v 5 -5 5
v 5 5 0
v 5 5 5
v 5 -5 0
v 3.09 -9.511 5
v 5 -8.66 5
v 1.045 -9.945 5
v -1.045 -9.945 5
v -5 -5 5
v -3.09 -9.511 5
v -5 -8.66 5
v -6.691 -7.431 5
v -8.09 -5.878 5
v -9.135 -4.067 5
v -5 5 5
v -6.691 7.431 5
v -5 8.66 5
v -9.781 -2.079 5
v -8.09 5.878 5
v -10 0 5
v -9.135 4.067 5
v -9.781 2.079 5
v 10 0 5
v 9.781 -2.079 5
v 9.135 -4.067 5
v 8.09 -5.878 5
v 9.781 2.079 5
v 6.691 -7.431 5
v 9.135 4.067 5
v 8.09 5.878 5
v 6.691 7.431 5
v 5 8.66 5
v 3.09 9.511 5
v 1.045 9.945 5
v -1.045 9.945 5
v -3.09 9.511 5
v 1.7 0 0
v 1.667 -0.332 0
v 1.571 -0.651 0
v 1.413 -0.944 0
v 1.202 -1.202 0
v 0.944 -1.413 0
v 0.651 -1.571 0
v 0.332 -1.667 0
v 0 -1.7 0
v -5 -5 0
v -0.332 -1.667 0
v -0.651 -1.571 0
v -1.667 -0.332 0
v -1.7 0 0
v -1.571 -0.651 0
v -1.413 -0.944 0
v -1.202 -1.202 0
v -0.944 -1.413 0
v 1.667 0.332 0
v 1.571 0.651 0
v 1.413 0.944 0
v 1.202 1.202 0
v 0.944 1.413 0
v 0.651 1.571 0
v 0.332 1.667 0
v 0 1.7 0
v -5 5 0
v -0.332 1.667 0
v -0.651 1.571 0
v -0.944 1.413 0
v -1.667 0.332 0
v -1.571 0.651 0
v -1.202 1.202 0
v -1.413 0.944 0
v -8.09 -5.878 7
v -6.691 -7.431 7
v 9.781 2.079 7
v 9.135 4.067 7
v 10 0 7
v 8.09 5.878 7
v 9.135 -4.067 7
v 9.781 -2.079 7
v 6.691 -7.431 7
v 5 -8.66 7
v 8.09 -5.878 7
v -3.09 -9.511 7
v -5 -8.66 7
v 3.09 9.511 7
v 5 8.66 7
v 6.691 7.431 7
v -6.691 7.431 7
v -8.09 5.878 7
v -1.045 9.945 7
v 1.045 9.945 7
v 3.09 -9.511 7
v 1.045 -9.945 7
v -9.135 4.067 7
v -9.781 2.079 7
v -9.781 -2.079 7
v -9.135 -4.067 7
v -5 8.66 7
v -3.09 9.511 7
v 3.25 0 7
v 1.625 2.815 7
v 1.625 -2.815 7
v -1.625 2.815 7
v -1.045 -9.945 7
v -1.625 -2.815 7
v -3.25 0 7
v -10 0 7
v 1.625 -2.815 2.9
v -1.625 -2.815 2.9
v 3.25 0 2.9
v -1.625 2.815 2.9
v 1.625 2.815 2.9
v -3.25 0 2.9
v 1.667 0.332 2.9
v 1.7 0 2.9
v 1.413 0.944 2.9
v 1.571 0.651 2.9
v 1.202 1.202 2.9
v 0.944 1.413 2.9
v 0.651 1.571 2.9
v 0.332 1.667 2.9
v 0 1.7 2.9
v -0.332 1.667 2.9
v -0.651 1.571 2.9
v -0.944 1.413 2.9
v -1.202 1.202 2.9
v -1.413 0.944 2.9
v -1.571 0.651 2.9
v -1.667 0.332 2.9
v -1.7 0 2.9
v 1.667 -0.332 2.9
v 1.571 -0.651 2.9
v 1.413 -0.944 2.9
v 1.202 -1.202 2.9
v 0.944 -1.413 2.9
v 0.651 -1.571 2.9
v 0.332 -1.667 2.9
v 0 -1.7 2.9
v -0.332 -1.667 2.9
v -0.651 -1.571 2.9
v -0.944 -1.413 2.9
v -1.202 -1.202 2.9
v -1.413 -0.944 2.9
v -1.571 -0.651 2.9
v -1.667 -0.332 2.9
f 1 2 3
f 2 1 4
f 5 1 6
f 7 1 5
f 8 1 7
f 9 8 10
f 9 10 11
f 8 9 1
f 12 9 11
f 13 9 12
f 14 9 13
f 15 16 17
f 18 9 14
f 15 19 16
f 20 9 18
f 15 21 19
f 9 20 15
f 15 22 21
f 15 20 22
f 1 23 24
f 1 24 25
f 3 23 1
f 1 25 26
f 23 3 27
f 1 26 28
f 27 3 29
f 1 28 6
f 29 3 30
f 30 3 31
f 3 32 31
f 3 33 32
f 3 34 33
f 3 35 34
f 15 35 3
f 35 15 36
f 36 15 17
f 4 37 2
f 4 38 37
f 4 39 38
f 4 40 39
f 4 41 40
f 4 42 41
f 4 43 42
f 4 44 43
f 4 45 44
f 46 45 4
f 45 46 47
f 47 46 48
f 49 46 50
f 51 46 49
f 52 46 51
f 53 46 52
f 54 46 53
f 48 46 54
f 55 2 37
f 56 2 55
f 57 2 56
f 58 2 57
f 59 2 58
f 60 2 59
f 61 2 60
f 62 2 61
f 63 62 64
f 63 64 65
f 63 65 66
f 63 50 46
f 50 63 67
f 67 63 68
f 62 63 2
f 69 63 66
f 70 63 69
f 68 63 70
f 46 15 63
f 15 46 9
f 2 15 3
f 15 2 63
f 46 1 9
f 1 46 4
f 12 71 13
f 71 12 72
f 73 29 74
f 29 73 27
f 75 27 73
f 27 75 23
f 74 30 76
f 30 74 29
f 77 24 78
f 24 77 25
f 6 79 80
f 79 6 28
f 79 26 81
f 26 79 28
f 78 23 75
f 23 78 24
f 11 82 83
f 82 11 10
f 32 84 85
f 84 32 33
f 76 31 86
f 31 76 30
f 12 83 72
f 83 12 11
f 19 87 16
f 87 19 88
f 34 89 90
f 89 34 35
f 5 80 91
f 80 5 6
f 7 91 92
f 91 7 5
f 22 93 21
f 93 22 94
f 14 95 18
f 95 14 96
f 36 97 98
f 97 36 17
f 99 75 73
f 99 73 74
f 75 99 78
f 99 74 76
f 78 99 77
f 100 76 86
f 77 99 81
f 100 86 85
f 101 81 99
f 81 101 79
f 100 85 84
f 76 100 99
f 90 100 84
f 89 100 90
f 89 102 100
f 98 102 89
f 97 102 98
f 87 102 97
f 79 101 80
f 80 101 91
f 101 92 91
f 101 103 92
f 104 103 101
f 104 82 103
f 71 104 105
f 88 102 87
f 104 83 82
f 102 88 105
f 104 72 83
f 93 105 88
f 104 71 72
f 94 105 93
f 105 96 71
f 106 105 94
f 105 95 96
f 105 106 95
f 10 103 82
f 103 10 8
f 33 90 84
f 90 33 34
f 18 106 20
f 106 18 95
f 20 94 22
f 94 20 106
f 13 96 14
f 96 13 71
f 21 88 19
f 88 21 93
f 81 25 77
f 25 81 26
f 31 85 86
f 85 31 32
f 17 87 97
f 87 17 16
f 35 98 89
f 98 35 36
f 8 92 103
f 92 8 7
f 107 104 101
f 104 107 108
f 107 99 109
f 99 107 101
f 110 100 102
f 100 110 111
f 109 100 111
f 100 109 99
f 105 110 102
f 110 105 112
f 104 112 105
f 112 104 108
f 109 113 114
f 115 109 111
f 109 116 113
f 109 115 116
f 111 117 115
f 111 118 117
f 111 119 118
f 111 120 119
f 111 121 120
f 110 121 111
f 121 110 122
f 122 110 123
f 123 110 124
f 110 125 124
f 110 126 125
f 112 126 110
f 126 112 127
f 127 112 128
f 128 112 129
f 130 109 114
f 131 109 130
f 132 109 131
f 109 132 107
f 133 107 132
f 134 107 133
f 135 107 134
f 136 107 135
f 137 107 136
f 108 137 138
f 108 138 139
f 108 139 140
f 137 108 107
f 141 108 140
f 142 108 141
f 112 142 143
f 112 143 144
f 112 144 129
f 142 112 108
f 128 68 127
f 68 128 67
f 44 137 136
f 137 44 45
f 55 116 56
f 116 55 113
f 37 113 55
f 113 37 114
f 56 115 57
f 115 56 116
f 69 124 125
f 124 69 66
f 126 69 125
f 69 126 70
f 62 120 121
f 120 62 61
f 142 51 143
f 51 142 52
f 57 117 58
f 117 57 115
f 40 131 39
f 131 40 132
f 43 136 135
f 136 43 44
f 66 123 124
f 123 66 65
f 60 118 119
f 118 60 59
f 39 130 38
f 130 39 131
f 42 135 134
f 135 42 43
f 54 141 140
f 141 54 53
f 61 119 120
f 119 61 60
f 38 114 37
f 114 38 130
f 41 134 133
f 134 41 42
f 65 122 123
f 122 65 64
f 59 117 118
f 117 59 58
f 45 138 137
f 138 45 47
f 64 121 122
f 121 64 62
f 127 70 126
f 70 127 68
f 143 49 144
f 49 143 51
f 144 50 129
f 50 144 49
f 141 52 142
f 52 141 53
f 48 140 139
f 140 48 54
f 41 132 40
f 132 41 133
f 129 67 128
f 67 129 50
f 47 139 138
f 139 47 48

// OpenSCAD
thickness_border=1.8; //epaisseur de la languette
thickness_device=18; 
thickness_box=5;//epaisseur de la boite
length_border=5;
height_device=20;
length_device=24.5;
border=1;

cjmcu_height=14.6;
cjmcu_width=20.1;
cjmcu_security=0.3;
cjmcu_connector=3.5;
cjmcu_back=4;
cjmcu_border=2;
cjmcu_board=1.6;
cjmcu_stopper=1;

bme_height=14.1;
bme_width=11.1;
bme_security=0.3;
bme_connector=3.5;
bme_back=4;
bme_border=2;
bme_board=1.6;
bme_stopper=1;

function nbhole(length, border)=
    let(nb=floor((length)/(border)))
    (nb-(floor(nb/2)*2)==0) ? nb+1 : nb;


module box() {
    difference() {
        #cube([length_device+2*length_border,thickness_device,height_device]);
        translate([0,thickness_border,0]) cube([length_border,thickness_device-2*thickness_border, height_device]);
        translate([length_device+length_border,thickness_border,0]) cube([length_border,thickness_device-2*thickness_border, height_device]);
    }
}

module grille(length, depth, height, border) {
    difference() {
        cube([length+2*border, depth+border,height+2*border]);
        translate([border,0, border]) cube([length, depth,height]);
        translate([border,border,0]) grille_holes(length-2*border, depth, height, border);
        translate([0,border,height+border]) rotate([0,90,0]) grille_holes(height-2*border, depth, length, border);
        translate([length+border,0,height+border]) rotate([0,90,90]) grille_holes(height-2*border, length+2*border, depth, border);
    }
}

module grille_holes(length, depth, height, border) {
    nb=nbhole(length,border);
    hole=length/nb;
    /*for (j=[0:floor(nb/2)+1]) {
       for (i=[0:2]) {
          translate([(j*2*hole),i*((depth-4*border)/3+border), 0])cube([hole,(depth-4*border)/3,height+2*border]);
       }
    }*/
    for (j=[0:floor(nb/2)+1]) {
       translate([(j*2*hole),0, 0]) cube([hole,(depth-2*border),height+2*border]);
    }
}
//#######################################################

module cjmcu811_back(height=14, width=20, security=0.2, connector=3.5, back=4, border=2, board=1.6, hole=3, hole_distance=0.5,hole_distance_bottom=1) {
    difference() {
        cube([width+2*security+2*border, back+board, height+2*security+2*border]);
        translate([border, back, border]) cube([width+2*security, board, height+2*security]);
        translate([border, 0, height+border-connector]) cube([width+2*security, back, connector+2*security]);
    }
    translate([border+security+hole_distance+hole/2, back, border+security+hole_distance_bottom+hole/2]) rotate([-90,0,0]) cylinder(d=hole-2*security, h=3*board, $fn=64);
    translate([border+security+width-hole_distance-hole/2, back, border+security+hole_distance_bottom+hole/2]) rotate([-90,0,0]) cylinder(d=hole-2*security, h=3*board, $fn=64);
}

module cjmcu811_connector(height=14, width=20, security=0.2, connector=3.5, depth=12, back=4, border=2) {
    translate([border, -depth, height+border-connector]) cube([width+2*security, depth, connector+2*security]);
}


module cjmcu811_front(height=14, width=20, security=0.2, connector=3.5, back=4, board=1.6, border=2, box_border=1 ,stopper=1,stopper_height=3) {
    difference() {
        cube([width+2*security+2*border+2*box_border, back+stopper+board, height+2*security++2*border+2*box_border]);
        translate([box_border, 0, box_border]) cube([width+2*security+2*border, back+board+stopper, height+2*security+2*border]);
        translate([border+box_border, back+board, height+border+box_border-connector]) cube([width+2*security, stopper, connector+2*security]);
        translate([border+box_border, back+board, border+box_border+security]) cube([width+2*security, stopper, height-connector+2*security-stopper_height]);
    }
}

module box_cjmcu811_back() {
    difference() {
        box();
        translate([(length_device+2*length_border-(cjmcu_width+2*cjmcu_security+2*cjmcu_border))/2,thickness_device,(height_device-(cjmcu_height+2*cjmcu_security+2*cjmcu_border))/2]) {
            cjmcu811_connector(height=cjmcu_height, width=cjmcu_width, security=cjmcu_security, back=cjmcu_back, border=cjmcu_border, depth=thickness_device);
        //cjmcu811_front();
        }
    }
    translate([(length_device+2*length_border-(cjmcu_width+2*cjmcu_security+2*cjmcu_border))/2,thickness_device,(height_device-(cjmcu_height+2*cjmcu_security+2*cjmcu_border))/2]) {
        cjmcu811_back(height=cjmcu_height, width=cjmcu_width, security=cjmcu_security, back=cjmcu_back, border=cjmcu_border);
        //cjmcu811_front();
    }
}

module box_cjmcu811_front(depth=5, border=1, box_security=0.15) {
    cjmcu811_front(height=cjmcu_height+box_security, width=cjmcu_width+box_security, security=cjmcu_security, back=cjmcu_back, border=cjmcu_border, box_border=border);
    translate([0,cjmcu_back+cjmcu_stopper+cjmcu_board-cjmcu_border,0]) grille(cjmcu_width+2*cjmcu_security+2*cjmcu_border+box_security, depth, cjmcu_height+2*cjmcu_security+2*cjmcu_border+box_security, border);
}


//#######################################################

module bme280_back(height=14, width=20, security=0.2, connector=3.5, back=4, border=2, board=1.6, hole=3, hole_distance=1,hole_distance_bottom=1.4) {
    difference() {
        cube([width+2*security+2*border, back+board, height+2*security+2*border]);
        translate([border, back, border]) cube([width+2*security, board, height+2*security]);
        translate([border, 0, height+border-connector]) cube([width+2*security, back, connector+2*security]);
        #translate([border,back-4,border])cube([width-hole_distance-hole-security,4,7]);
    }
    //translate([border+security+hole_distance+hole/2, back, border+security+hole_distance+hole/2]) rotate([-90,0,0]) cylinder(d=hole-2*security, h=3*board, $fn=64);
    translate([border+security+width-hole_distance-hole/2, back, border+security+hole_distance_bottom+hole/2]) rotate([-90,0,0]) cylinder(d=hole-2*security, h=3*board, $fn=64);
}

module bme280_connector(height=14, width=20, security=0.2, connector=3.5, depth=12, back=4, border=2) {
    translate([border, -depth, height+border-connector]) cube([width+2*security, depth, connector+2*security]);
}


module bme280_front(height=14, width=20, security=0.2, connector=3, back=4, board=1.6, border=2, box_border=1 ,stopper=1,stopper_height=3) {
    difference() {
        cube([width+2*security+2*border+2*box_border, back+stopper+board, height+2*security++2*border+2*box_border]);
        translate([box_border, 0, box_border]) cube([width+2*security+2*border, back+board+stopper, height+2*security+2*border]);
        translate([border+box_border, back+board, height+border+box_border-connector]) cube([width+2*security, stopper, connector+2*security]);
        translate([border+box_border, back+board, border+box_border+security]) cube([width+2*security, stopper, height-connector+2*security-stopper_height]);
    }
}

module box_bme280_back() {
    difference() {
        box();
        translate([(length_device+2*length_border-(bme_width+2*bme_security+2*bme_border))/2,thickness_device,(height_device-(bme_height+2*bme_security+2*bme_border))/2]) {
            bme280_connector(height=bme_height, width=bme_width, security=bme_security, back=bme_back, border=bme_border, depth=thickness_device);
            
        //bme280_front();
        }
    }
    translate([(length_device+2*length_border-(bme_width+2*bme_security+2*bme_border))/2,thickness_device,(height_device-(bme_height+2*bme_security+2*bme_border))/2]) {
        bme280_back(height=bme_height, width=bme_width, security=bme_security, back=bme_back, border=bme_border);
        //bme280_front();
    }
}

module box_bme280_front(depth=5, border=1, box_security=0.15) {
    bme280_front(height=bme_height+box_security, width=bme_width+box_security, security=bme_security, back=bme_back, border=bme_border, box_border=border);
    translate([0,bme_back+bme_stopper+bme_board-bme_border,0]) grille(bme_width+2*bme_security+2*bme_border+box_security, depth, bme_height+2*bme_security+2*bme_border+box_security, border);
}

//#######################################################

module led(security=0.3, height=8.5, diameter=5, base=5.6, base_height=1,fake_base=10) {
    if (fake_base>0) translate([0,0,-fake_base]) cylinder(d=base+security, h=fake_base,$fn=64);
    cylinder(d=base+security, h=security+base_height,$fn=64);
    translate([0,0,base_height]) cylinder(d=diameter+security, h=height-diameter/2-base_height,$fn=64);
    translate([0,0,height-diameter/2]) sphere(d=diameter+security,$fn=64);
    
}

module light(diameter=10, base=5, base_height=1, thickness=thickness_device, inside=3, border=2) {
    difference() {
        union() {
            translate([0,0,thickness+base_height-inside]) led(security=0, height=8.5+border, diameter=5+2*border, base=5.6+border,fake_base=0);
            cylinder(d=diameter, h=thickness,$fn=64);
            translate([0,0,thickness])cylinder(d=diameter+2*base, h=base_height,$fn=64);
        }
        translate([0,0,thickness+base_height-inside]) led(fake_base=thickness+base_height);
    }
    
}

//#######################################################


module screw(hole=3.4, diameter=6.5, screw_height=3.2, height=5, width=8) {
    difference() {
        translate([-width/2, -width/2, 0]) cube([width, width,height]);
        screw_footprint(hole=hole, diameter=diameter, screw_height=screw_height, height=height);
    }
}


module screw_footprint(hole=3.4, diameter=6.5, screw_height=3.2, height=5) {
    translate([0, 0, (height-screw_height)/2])cylinder(d=diameter, h=height, $fn=6);
    cylinder(d=hole,h=height,$fn=32);
}

// ##############################

module support_board(hole=3.2, diam=5, height=5, width=10, base=5) {
    translate([0,0,base]) {
        difference() {
            cylinder(d=diam, h=height, $fn=32);
            cylinder(d=hole, h=height, $fn=32);   
        }
    }
    translate([0,0,base]) rotate([180,0,0]) screw(width=width, height=base);
}

module support_iC880A(diam=5,height=5, width=10, base=5) {
    translate([(width/2)-6.15,(width/2)-2.9,0]) {
        translate([6.15,2.9,0]) rotate([0,0,180])support_board(diam=diam, width=width,height=height, base=base);
        translate([61.15,2.9,0]) rotate([0,0,180])support_board(diam=diam, width=width,height=height, base=base);
        translate([6.15,76.9,0]) rotate([0,0,0]) support_board(diam=diam, width=width,height=height, base=base);
        translate([61.15,76.9,0]) rotate([0,0,0]) support_board(diam=diam, width=width,height=height, base=base);
    }
}

//encoche 67x86
//border=thickness_border,outside_border=5
module box_iC880A(diam=5,height=5.2, width=10, thickness=thickness_box+0.2, border=thickness_border,outside_border=5) {
    translate([0,0,-border]) support_iC880A(diam=diam, width=width,height=height, base=thickness+2*border);
    translate([0,-border-outside_border,-border]) {
        difference() {
            cube([(61.15-6.15)+width+border+outside_border,(76.9-2.9)+width+2*border+2*outside_border , thickness+2*border]);
            #translate([0,border+outside_border,0]) cube([(61.15-6.15)+width,(76.9-2.9)+width , thickness+2*border]);
            translate([0,(76.9-2.9)+width+2*border+outside_border,border]) cube([(61.15-6.15)+width+border+outside_border,outside_border , thickness]);
            translate([(61.15-6.15)+width+border,0,border]) cube([outside_border,(76.9-2.9)+width+2*border+2*outside_border , thickness]);
            translate([0,0,border]) cube([(61.15-6.15)+width+border+outside_border,outside_border , thickness]);
            
        }
    }
}


module box_iC880A_old(diam=5,height=5.2, width=10, thickness=thickness_device, border=thickness_border,outside_border=5) {
    translate([0,0,-border]) support_iC880A(diam=diam, width=width,height=height, base=thickness_device+2*border);
    translate([-border-outside_border,0,-border]) {
        difference() {
            cube([(61.15-6.15)+width+2*border+2*outside_border,(76.9-2.9)+width+border+outside_border , thickness+2*border]);
            #translate([border+outside_border,0,0]) cube([(61.15-6.15)+width,(76.9-2.9)+width , thickness+2*border]);
            translate([0,(76.9-2.9)+width+border,border]) cube([(61.15-6.15)+width+2*border+2*outside_border,outside_border , thickness]);
            translate([0,0,border]) cube([outside_border,(76.9-2.9)+width+border+outside_border , thickness]);
            translate([(61.15-6.15)+width+2*border+outside_border,0,border]) cube([outside_border,(76.9-2.9)+width+border+outside_border , thickness]);
            
        }
    }
}

// #############################

// CO2 Sensor 1.2
co2_width=32;
co2_length=42;
co2_fix_hole=3.2;
co2_fix_diam=6;
co2_fix_border=3.5;
co2_sensor_diam=20;
co2_sensor_length=8;
co2_sensor_top_diam=13;
co2_sensor_top_border=2;
co2_sensor_top_height=6;
co2_board_top=7;
co2_sensor_height=27;

module box_co2_protection(security=0.2,border=2, top=5,thickness=1,box_thickness=2.5, angle=10) {
    height=co2_sensor_height+top-((co2_board_top+thickness+box_thickness)+(box_thickness+thickness));
    diam=co2_sensor_diam+co2_sensor_top_diam+2*co2_sensor_top_border+security;
    difference() {
        cylinder(d=diam+2*border, h=height+border, $fn=128);
        cylinder(d=diam, h=height, $fn=128);
        translate([0,0,co2_sensor_top_height]) for (i=[0:2*angle:360]) rotate([0,0,i]) segment(diam=diam+2*border+security, height=height-co2_sensor_top_height+border,angle=angle, int=co2_sensor_top_diam+2*border);
        cylinder(d=co2_sensor_top_diam, h=height+border, $fn=128);
    }
}

module segment(diam=30, height=10, angle=10, int=20) {
    difference() {
        cylinder(d=diam, h=height);
        cylinder(d=int, h=height);
        translate([-diam/2,-diam/2,0]) cube([diam/2,diam,height]);
        rotate([0,0,-angle]) translate([-diam/2,-diam/2,0])  {
            difference() {
                cube([diam,diam,height]);
                cube([diam/2,diam,height]);
            }
        }
                
    }
}

module round_border(diam=10, height=1) {
    difference() {
        translate([-diam/2, -diam/2, 0]) cube([diam, diam, height]);
        cylinder(d=diam, h=height, $fn=64);
        translate([-diam/2, -diam/2, 0]) cube([diam, diam/2, height]);
        translate([0, 0, 0]) cube([diam/2, diam/2, height]);
    }
}

module box_co2_sensor_top(thickness=1,border=3, width=8, height=2.5) {
    difference() {
        union() {
            translate([-width,-width,0]) cube([co2_width+2*border+2*width, co2_length+2*border+2*width, thickness]);
            difference() {
                translate([0,0,thickness]) cube([co2_width+2*border, co2_length+2*border, height]);           
                translate([border, border, thickness]) cube([co2_width, co2_length, height]);
            }
            translate([border+co2_fix_border, border+co2_fix_border, thickness]) cylinder(d=co2_fix_diam, h=height, $fn=32);
            translate([border+co2_width-co2_fix_border, border+co2_fix_border, thickness]) cylinder(d=co2_fix_diam, h=height, $fn=32);
            translate([border+co2_fix_border, border+co2_length-co2_fix_border, thickness]) cylinder(d=co2_fix_diam, h=height, $fn=32);
            translate([border+co2_width-co2_fix_border, border+co2_length-co2_fix_border, thickness]) cylinder(d=co2_fix_diam, h=height, $fn=32);
        }
        translate([border+co2_fix_border, border+co2_fix_border, 0]) cylinder(d=co2_fix_hole, h=height+thickness, $fn=32);
        translate([border+co2_width-co2_fix_border, border+co2_fix_border, 0]) cylinder(d=co2_fix_hole, h=height+thickness, $fn=32);
        translate([border+co2_fix_border, border+co2_length-co2_fix_border, 0]) cylinder(d=co2_fix_hole, h=height+thickness, $fn=32);
        translate([border+co2_width-co2_fix_border, border+co2_length-co2_fix_border, 0]) cylinder(d=co2_fix_hole, h=height+thickness, $fn=32);
        translate([border+co2_width/2, border+co2_sensor_length, 0]) cylinder(d=co2_sensor_diam, h=thickness+height, $fn=32);
        
        
        translate([-width/2,-width/2,0]) rotate([0,0,90]) round_border(diam=width, height=thickness);
        translate([co2_width+2*border+width/2,-width/2,0]) rotate([0,0,180]) round_border(diam=width, height=thickness);
        translate([co2_width+2*border+width/2,co2_length+2*border+width/2,0]) rotate([0,0,270]) round_border(diam=width, height=thickness);
        translate([-width/2,co2_length+2*border+width/2,0]) rotate([0,0,0]) round_border(diam=width, height=thickness);
    }
    difference() {
        translate([border+co2_width/2, border+co2_sensor_length, -co2_sensor_top_height]) cylinder(d=co2_sensor_diam+co2_sensor_top_diam+2*co2_sensor_top_border, h=co2_sensor_top_height, $fn=128);
        translate([border+co2_width/2, border+co2_sensor_length, -co2_sensor_top_height]) cylinder(d=co2_sensor_diam+co2_sensor_top_diam, h=co2_sensor_top_height, $fn=32);
    }
}

module box_co2_sensor_bottom(thickness=1,border=3, width=8, height=2.5) {
    picot_height=co2_board_top+thickness+height;
    difference() {
        union() {
            difference() {
                union() {
                    translate([-width,-width,0]) cube([co2_width+2*border+2*width, co2_length+2*border+2*width, thickness]);
                    translate([0,0,thickness]) cube([co2_width+2*border, co2_length+2*border, height]); 
                }          
                translate([border, border, 0]) cube([co2_width, co2_length, height+thickness]);
            }
            translate([border+co2_fix_border, border+co2_fix_border, -co2_board_top]) cylinder(d=co2_fix_diam, h=co2_board_top+height+thickness, $fn=32);
            translate([border+co2_width-co2_fix_border, border+co2_fix_border, -co2_board_top]) cylinder(d=co2_fix_diam, h=co2_board_top+height+thickness, $fn=32);
            translate([border+co2_fix_border, border+co2_length-co2_fix_border, -co2_board_top]) cylinder(d=co2_fix_diam, h=co2_board_top+height+thickness, $fn=32);
            translate([border+co2_width-co2_fix_border, border+co2_length-co2_fix_border,-co2_board_top]) cylinder(d=co2_fix_diam, h=co2_board_top+height+thickness, $fn=32);
            translate([border,border,0]) cube([co2_fix_border,co2_fix_border,height+thickness]);
            translate([border+co2_width-co2_fix_border,border,0]) cube([co2_fix_border,co2_fix_border,height+thickness]);
            translate([border,border+co2_length-co2_fix_border,0]) cube([co2_fix_border,co2_fix_border,height+thickness]);
            translate([border+co2_width-co2_fix_border,border+co2_length-co2_fix_border,0]) cube([co2_fix_border,co2_fix_border,height+thickness]);
        }
        translate([border+co2_fix_border, border+co2_fix_border, -co2_board_top]) cylinder(d=co2_fix_hole, h=co2_board_top+height+thickness, $fn=32);
        translate([border+co2_width-co2_fix_border, border+co2_fix_border, -co2_board_top]) cylinder(d=co2_fix_hole, h=co2_board_top+height+thickness, $fn=32);
        translate([border+co2_fix_border, border+co2_length-co2_fix_border, -co2_board_top]) cylinder(d=co2_fix_hole, h=co2_board_top+height+thickness, $fn=32);
        translate([border+co2_width-co2_fix_border, border+co2_length-co2_fix_border, -co2_board_top]) cylinder(d=co2_fix_hole, h=co2_board_top+height+thickness, $fn=32);
        translate([border+co2_width/2, border+co2_sensor_length, 0]) cylinder(d=co2_sensor_diam, h=thickness+height, $fn=32);
        
    }
}




// ################################################################################

heltec_proto_width=51;
heltec_proto_height=38;
heltec_proto_depth=19.5;
heltec_proto_hole_distance=30.5;

module box_heltec_bottom(border=2, inter_board=10, left_co2=5,height=5, heltec_fix=4, security_board=1) {
    box_length=co2_length+heltec_proto_width+inter_board+2*border+left_co2;
    box_depth=2*border+co2_width;
    
    difference() {
        union() {
            cube([box_length,box_depth,height]);
        }
        // screw co2
        translate([0,border,0]) {
            translate([left_co2,co2_width,0]) {
                rotate([0,0,-90]) {
                    translate([co2_fix_border, co2_fix_border, height]) rotate([180,0,0]) screw_footprint(hole=co2_fix_hole,height=height);
                    translate([co2_width-co2_fix_border, co2_fix_border, height]) rotate([180,0,0]) screw_footprint(hole=co2_fix_hole,height=height);
                    translate([co2_fix_border, co2_length-co2_fix_border, height]) rotate([180,0,0]) screw_footprint(hole=co2_fix_hole,height=height);
                    translate([co2_width-co2_fix_border, co2_length-co2_fix_border, height]) rotate([180,0,0]) screw_footprint(hole=co2_fix_hole,height=height);
                }
            }
        }
        // screw box
        translate([box_length-heltec_proto_width-border, box_depth-(heltec_proto_depth+height+heltec_fix),height]) {
            translate([heltec_proto_width-co2_fix_diam/2,height/2,0]) rotate([180,0,0]) screw_footprint(hole=co2_fix_hole,height=height);
        }
    }
    // ## Heltec Fixation ########################
    
    translate([box_length-heltec_proto_width-border, box_depth-(heltec_proto_depth+height+heltec_fix),height]) {
        difference() {
            union() {
                cube([heltec_proto_width, height,(2*heltec_proto_height)/3+security_board]);
                translate([(heltec_proto_width-heltec_proto_hole_distance)/2,height+heltec_fix,heltec_proto_height/2+security_board]) rotate([90,0,0]) cylinder(d=co2_fix_diam, h=heltec_fix, $fn=32);
                translate([heltec_proto_width-(heltec_proto_width-heltec_proto_hole_distance)/2,height+heltec_fix,heltec_proto_height/2+security_board]) rotate([90,0,0]) cylinder(d=co2_fix_diam, h=heltec_fix, $fn=32);
                translate([heltec_proto_width-co2_fix_diam/2,height/2,0]) cylinder(d=co2_fix_diam, h=(2*heltec_proto_height)/3+security_board, $fn=32);
            }
            translate([(heltec_proto_width-heltec_proto_hole_distance)/2,height+heltec_fix,heltec_proto_height/2+security_board]) rotate([90,0,0]) cylinder(d=co2_fix_hole, h=heltec_fix, $fn=32);
            translate([heltec_proto_width-(heltec_proto_width-heltec_proto_hole_distance)/2,height+heltec_fix,heltec_proto_height/2+security_board]) rotate([90,0,0]) cylinder(d=co2_fix_hole, h=heltec_fix, $fn=32);
            translate([(heltec_proto_width-heltec_proto_hole_distance)/2,height,heltec_proto_height/2+security_board]) rotate([90,0,0]) screw_footprint(hole=co2_fix_hole,height=height);
            translate([heltec_proto_width-(heltec_proto_width-heltec_proto_hole_distance)/2,height,heltec_proto_height/2+security_board]) rotate([90,0,0]) screw_footprint(hole=co2_fix_hole,height=height);
            translate([heltec_proto_width-co2_fix_diam/2,height/2,0]) cylinder(d=co2_fix_hole, h=(2*heltec_proto_height)/3+security_board, $fn=32);
        }
            
    }

    
    
    // ## CO2 Fixation ########################
    picot_height=10;
    translate([0,border,height]) {
        translate([left_co2,co2_width,0]) {
            rotate([0,0,-90]) {
                difference() {
                    union() {
                        translate([co2_fix_border, co2_fix_border, 0]) cylinder(d=co2_fix_diam, h=picot_height, $fn=32);
                        translate([co2_width-co2_fix_border, co2_fix_border, 0]) cylinder(d=co2_fix_diam, h=picot_height, $fn=32);
                        translate([co2_fix_border, co2_length-co2_fix_border, 0]) cylinder(d=co2_fix_diam, h=picot_height, $fn=32);
                        translate([co2_width-co2_fix_border, co2_length-co2_fix_border,0]) cylinder(d=co2_fix_diam, h=picot_height, $fn=32);
                    }
                    translate([co2_fix_border, co2_fix_border, 0]) cylinder(d=co2_fix_hole, h=picot_height, $fn=32);
                    translate([co2_width-co2_fix_border, co2_fix_border, 0]) cylinder(d=co2_fix_hole, h=picot_height, $fn=32);
                    translate([co2_fix_border, co2_length-co2_fix_border, 0]) cylinder(d=co2_fix_hole, h=picot_height, $fn=32);
                    translate([co2_width-co2_fix_border, co2_length-co2_fix_border, 0]) cylinder(d=co2_fix_hole, h=picot_height, $fn=32);
                    translate([co2_width/2, co2_sensor_length, 0]) cylinder(d=co2_sensor_diam, h=height, $fn=32);
                    
                }
            }
        }
    }
    
}

module box_heltec_top(border=2, inter_board=10, left_co2=5,height=5, heltec_fix=4, security=0.2, angle=10,picot_height=10, border_grille=5, security_board=1, screen_height=14, screen_width=25, screen_right=22, usb_height=10, usb_width=8, usb_right=4, usb_border=5) {
    screw_head_diam=6;
    screw_head_height=3;
    box_length=co2_length+heltec_proto_width+inter_board+2*border+left_co2;
    box_depth=2*border+co2_width;
    box_height=height+heltec_proto_height+border+height+security_board;
    diam=co2_width-2*border;
    //cap_depth=box_depth-heltec_proto_depth-heltec_fix;
    cap_depth=20;
    cap_right=screw_head_diam+2*border;
    cap_length=heltec_proto_width;
    echo(cap_length);
    echo(cap_depth);
    translate([-border-security, -border-security, 0]) {
        difference() {
            union() {
                difference() {
                    cube([box_length+2*border+2*security, box_depth+2*border+2*security, box_height+border]);
                    translate([border, border, 0]) cube([box_length+2*security, box_depth+2*security, box_height]);
                }
                translate([left_co2+co2_fix_border+border+security, co2_width+border+security+border-co2_fix_border, height+picot_height]) cylinder(d=co2_fix_diam, h=box_height-height-picot_height, $fn=32);
                translate([left_co2+co2_fix_border+border+security, co2_width+border+security+border-co2_fix_border, box_height+border-(screw_head_height+border)]) cylinder(d=screw_head_diam+2*border, h=screw_head_height+border, $fn=32);
                translate([left_co2+co2_fix_border+border+security, border+security+border+co2_fix_border, height+picot_height]) cylinder(d=co2_fix_diam, h=box_height-height-picot_height, $fn=32);
                translate([left_co2+co2_fix_border+border+security, border+security+border+co2_fix_border, box_height+border-(screw_head_height+border)]) cylinder(d=screw_head_diam+2*border, h=screw_head_height+border, $fn=32);
                
                //FIX coté Heltec
                translate([box_length-co2_fix_diam/2+security,height/2+box_depth-(heltec_proto_depth+height+heltec_fix)+border+security,height+(2*heltec_proto_height)/3]) {
                    
                    cylinder(d=co2_fix_diam, h=heltec_proto_height/3+border+height+security_board, $fn=32);
                    translate([0,0,heltec_proto_height/3+border-screw_head_height-border+height+security_board]) cylinder(d=screw_head_diam+2*border, h=screw_head_height+border, $fn=32);
                }
                // USB
                translate([box_length+border+2*security-usb_right, box_depth+border+security-usb_border-usb_width/2-border, height+heltec_proto_height/2+security_board-usb_height/2-border]) {
                    cube([border+usb_right, usb_width+2*border,usb_height+2*border]);
                }
            }
            //fixation coté CO2 Sensor
            translate([left_co2+co2_fix_border+border+security, co2_width+border+security+border-co2_fix_border, height+picot_height]) cylinder(d=co2_fix_hole, h=box_height-height-picot_height+border, $fn=32);
            translate([left_co2+co2_fix_border+border+security, co2_width+border+security+border-co2_fix_border, box_height+border-(screw_head_height)]) cylinder(d=screw_head_diam, h=screw_head_height, $fn=32);
            translate([left_co2+co2_fix_border+border+security, border+security+border+co2_fix_border, height+picot_height]) cylinder(d=co2_fix_hole, h=box_height-height-picot_height+border, $fn=32);
            translate([left_co2+co2_fix_border+border+security, border+security+border+co2_fix_border, box_height+border-(screw_head_height)]) cylinder(d=screw_head_diam, h=screw_head_height, $fn=32);
            // CO2 Sensor Aeration
            translate([border_grille, 0, box_height-border_grille-30]) grille_heltec();
            translate([border_grille, box_depth+border+security, box_height-border_grille-30]) grille_heltec(depth=border+2*security);
            translate([border, border_grille, box_height-border_grille-30]) rotate([0,0,90]) grille_heltec(width=box_depth+2*border-2*border_grille);
            translate([border+left_co2+co2_sensor_diam/2, (box_depth+2*border+2*security)/2, box_height+border-screw_head_height]) cylinder(d=co2_sensor_top_diam, h=screw_head_height, $fn=32);
            // TOP

            translate([box_length-cap_length-cap_right, border, box_height]) cube([cap_length, cap_depth, border]);
            translate([box_length-co2_fix_diam/2+security,height/2+box_depth-(heltec_proto_depth+height+heltec_fix)+border+security,height+(2*heltec_proto_height)/3]) cylinder(d=co2_fix_hole, h=heltec_proto_height/3+border+height+security_board, $fn=32);
            translate([box_length-co2_fix_diam/2+security,height/2+box_depth-(heltec_proto_depth+height+heltec_fix)+border+security,box_height+border-(screw_head_height)]) {
                cylinder(d=screw_head_diam, h=screw_head_height, $fn=32);
            }
            
            // Screen
            #translate([box_length-screen_right-screen_width, box_depth+border+2*security, height+heltec_proto_height/2+security_board-screen_height/2]) cube([screen_width,border, screen_height]);
            
            // USB
            //usb_height=10, usb_width=12, usb_right=4, usb_border=5
            #translate([box_length+2*security+border-usb_right, box_depth+border+security-usb_border-usb_width/2, height+heltec_proto_height/2+security_board-usb_height/2]) {
                cube([border+usb_right, usb_width,usb_height]);
            }
            
        }
        translate([box_length-cap_length-cap_right-2, border, box_height-height]){
           difference() {
               cube([12,cap_depth+height,height]);
               translate([7,cap_depth/2,height]) rotate([180,0,0]) screw_footprint();
           }
       }
       translate([box_length-10-cap_right, border, box_height-height]) {
           difference() {
               cube([12,cap_depth+height,height]);
               translate([5,cap_depth/2,height]) rotate([180,0,0]) screw_footprint();
           }
       }
    }
}


module grille_heltec(width=20, height=30, hole_width=3, hole_height=4, depth=2, border=1) {
    for (i=[0:hole_width+border:width]) {
        for (j=[0:hole_height+border:height]) {
            translate([i,0,j]) cube([hole_width,depth,hole_height]);
        }
    }
}


module trappe_heltec(width=20, length=heltec_proto_width,height=2, hole_width=3, hole_height=4, depth=2, border=1) {
    for (i=[0:hole_width+border:width]) {
        for (j=[0:hole_height+border:height]) {
            translate([i,0,j]) cube([hole_width,depth,hole_height]);
        }
    }
}

// ########## SCREEN BOX #####################


module fix_ecran(width=15, height=9, hole=3.4, border=5, depth=2) {
    difference() {
        union() {
            cylinder(d=width+2*border, h=depth);
            translate([-width/2, -height/2, depth]) cube([width, height, depth]);
        }
        cylinder(d=hole, h=2*depth, $fn=32);
    }
}

module fix_door(width=20, hole=3.4, border=2, height=5) {
    difference() {
        union() {
            //screw(width=10, hole=hole, height=height);
            translate([-5,-5,0]) cube([10, 10, height]);
            translate([0,0,height])cylinder(d=width, h=border);
        }
        translate([0,0,border]) screw_footprint(hole=3.4, diameter=6.5, screw_height=3.2, height=5); 
        #cylinder(d=hole, h=border, $fn=32);
    }
}

// ############################



module fix_fan_out(hole=3.4, diam=36, int_diam=21, size=40, depth=12, screw=32, border=5, thickness=2, angle=19, angle_border=5) {
    difference() {
        translate([-(size+2*border)/2, -(size+2*border)/2, 0]) cube([size+2*border, size+2*border, thickness]);
        translate([-screw/2, -screw/2, 0]) cylinder(d=hole, h=thickness, $fn=32);
        translate([screw/2, -screw/2, 0]) cylinder(d=hole, h=thickness, $fn=32);
        translate([screw/2, screw/2, 0]) cylinder(d=hole, h=thickness, $fn=32);
        translate([-screw/2, screw/2, 0]) cylinder(d=hole, h=thickness, $fn=32);
        for (i=[0:angle_border+angle:360]) rotate([0,0,i]) segment(diam=diam, height=thickness,angle=angle, int=int_diam);
        translate([-size/2, -size/2,0]) rotate([0,0,90]) round_border(diam=10, height=thickness);
        translate([size/2, size/2,0]) rotate([0,0,270]) round_border(diam=10, height=thickness);
        translate([size/2, -size/2,0]) rotate([0,0,180]) round_border(diam=10, height=thickness);
        translate([-size/2, size/2,0]) rotate([0,0,0]) round_border(diam=10, height=thickness);
    }
    
}


module fix_fan_in(hole=3.4, diam=36, int_diam=21, size=40, depth=12, screw=32, border=5, thickness=2, security=0.3) {
    difference() {
        translate([-(size+2*border)/2, -(size+2*border)/2, 0]) cube([size+2*border, size+2*border, border+depth-length_border]);
        translate([-(size+2*security)/2, -(size+2*security)/2, 0]) cube([size+2*security, size+2*security, depth-length_border]);
        translate([-screw/2, -screw/2, 0]) cylinder(d=hole, h=border+depth-length_border, $fn=32);
        translate([screw/2, -screw/2, 0]) cylinder(d=hole, h=border+depth-length_border, $fn=32);
        translate([screw/2, screw/2, 0]) cylinder(d=hole, h=border+depth-length_border, $fn=32);
        translate([-screw/2, screw/2, 0]) cylinder(d=hole, h=border+depth-length_border, $fn=32);
        translate([0,0, depth-length_border]) cylinder(d=diam, h=border, $fn=32);
        #translate([-screw/2, -screw/2, depth-length_border]) screw_footprint(height=border);
        translate([screw/2, -screw/2, depth-length_border]) screw_footprint(height=border);
        translate([screw/2, screw/2, depth-length_border]) screw_footprint(height=border);
        translate([-screw/2, screw/2, depth-length_border]) screw_footprint(height=border);
    }
    
}

box_cjmcu811_back();
box_cjmcu811_front();
box_bme280_back();
box_bme280_front();

box_co2_sensor_bottom();
box_co2_sensor_top();
box_co2_protection();
segment();

union() {
    box_heltec_bottom();
    box_heltec_top();
}
grille_heltec();


fix_ecran();
!fix_door();
fix_fan_out();
fix_fan_in();
round_border();
led();
light();
box_iC880A();
screw(width=10);
